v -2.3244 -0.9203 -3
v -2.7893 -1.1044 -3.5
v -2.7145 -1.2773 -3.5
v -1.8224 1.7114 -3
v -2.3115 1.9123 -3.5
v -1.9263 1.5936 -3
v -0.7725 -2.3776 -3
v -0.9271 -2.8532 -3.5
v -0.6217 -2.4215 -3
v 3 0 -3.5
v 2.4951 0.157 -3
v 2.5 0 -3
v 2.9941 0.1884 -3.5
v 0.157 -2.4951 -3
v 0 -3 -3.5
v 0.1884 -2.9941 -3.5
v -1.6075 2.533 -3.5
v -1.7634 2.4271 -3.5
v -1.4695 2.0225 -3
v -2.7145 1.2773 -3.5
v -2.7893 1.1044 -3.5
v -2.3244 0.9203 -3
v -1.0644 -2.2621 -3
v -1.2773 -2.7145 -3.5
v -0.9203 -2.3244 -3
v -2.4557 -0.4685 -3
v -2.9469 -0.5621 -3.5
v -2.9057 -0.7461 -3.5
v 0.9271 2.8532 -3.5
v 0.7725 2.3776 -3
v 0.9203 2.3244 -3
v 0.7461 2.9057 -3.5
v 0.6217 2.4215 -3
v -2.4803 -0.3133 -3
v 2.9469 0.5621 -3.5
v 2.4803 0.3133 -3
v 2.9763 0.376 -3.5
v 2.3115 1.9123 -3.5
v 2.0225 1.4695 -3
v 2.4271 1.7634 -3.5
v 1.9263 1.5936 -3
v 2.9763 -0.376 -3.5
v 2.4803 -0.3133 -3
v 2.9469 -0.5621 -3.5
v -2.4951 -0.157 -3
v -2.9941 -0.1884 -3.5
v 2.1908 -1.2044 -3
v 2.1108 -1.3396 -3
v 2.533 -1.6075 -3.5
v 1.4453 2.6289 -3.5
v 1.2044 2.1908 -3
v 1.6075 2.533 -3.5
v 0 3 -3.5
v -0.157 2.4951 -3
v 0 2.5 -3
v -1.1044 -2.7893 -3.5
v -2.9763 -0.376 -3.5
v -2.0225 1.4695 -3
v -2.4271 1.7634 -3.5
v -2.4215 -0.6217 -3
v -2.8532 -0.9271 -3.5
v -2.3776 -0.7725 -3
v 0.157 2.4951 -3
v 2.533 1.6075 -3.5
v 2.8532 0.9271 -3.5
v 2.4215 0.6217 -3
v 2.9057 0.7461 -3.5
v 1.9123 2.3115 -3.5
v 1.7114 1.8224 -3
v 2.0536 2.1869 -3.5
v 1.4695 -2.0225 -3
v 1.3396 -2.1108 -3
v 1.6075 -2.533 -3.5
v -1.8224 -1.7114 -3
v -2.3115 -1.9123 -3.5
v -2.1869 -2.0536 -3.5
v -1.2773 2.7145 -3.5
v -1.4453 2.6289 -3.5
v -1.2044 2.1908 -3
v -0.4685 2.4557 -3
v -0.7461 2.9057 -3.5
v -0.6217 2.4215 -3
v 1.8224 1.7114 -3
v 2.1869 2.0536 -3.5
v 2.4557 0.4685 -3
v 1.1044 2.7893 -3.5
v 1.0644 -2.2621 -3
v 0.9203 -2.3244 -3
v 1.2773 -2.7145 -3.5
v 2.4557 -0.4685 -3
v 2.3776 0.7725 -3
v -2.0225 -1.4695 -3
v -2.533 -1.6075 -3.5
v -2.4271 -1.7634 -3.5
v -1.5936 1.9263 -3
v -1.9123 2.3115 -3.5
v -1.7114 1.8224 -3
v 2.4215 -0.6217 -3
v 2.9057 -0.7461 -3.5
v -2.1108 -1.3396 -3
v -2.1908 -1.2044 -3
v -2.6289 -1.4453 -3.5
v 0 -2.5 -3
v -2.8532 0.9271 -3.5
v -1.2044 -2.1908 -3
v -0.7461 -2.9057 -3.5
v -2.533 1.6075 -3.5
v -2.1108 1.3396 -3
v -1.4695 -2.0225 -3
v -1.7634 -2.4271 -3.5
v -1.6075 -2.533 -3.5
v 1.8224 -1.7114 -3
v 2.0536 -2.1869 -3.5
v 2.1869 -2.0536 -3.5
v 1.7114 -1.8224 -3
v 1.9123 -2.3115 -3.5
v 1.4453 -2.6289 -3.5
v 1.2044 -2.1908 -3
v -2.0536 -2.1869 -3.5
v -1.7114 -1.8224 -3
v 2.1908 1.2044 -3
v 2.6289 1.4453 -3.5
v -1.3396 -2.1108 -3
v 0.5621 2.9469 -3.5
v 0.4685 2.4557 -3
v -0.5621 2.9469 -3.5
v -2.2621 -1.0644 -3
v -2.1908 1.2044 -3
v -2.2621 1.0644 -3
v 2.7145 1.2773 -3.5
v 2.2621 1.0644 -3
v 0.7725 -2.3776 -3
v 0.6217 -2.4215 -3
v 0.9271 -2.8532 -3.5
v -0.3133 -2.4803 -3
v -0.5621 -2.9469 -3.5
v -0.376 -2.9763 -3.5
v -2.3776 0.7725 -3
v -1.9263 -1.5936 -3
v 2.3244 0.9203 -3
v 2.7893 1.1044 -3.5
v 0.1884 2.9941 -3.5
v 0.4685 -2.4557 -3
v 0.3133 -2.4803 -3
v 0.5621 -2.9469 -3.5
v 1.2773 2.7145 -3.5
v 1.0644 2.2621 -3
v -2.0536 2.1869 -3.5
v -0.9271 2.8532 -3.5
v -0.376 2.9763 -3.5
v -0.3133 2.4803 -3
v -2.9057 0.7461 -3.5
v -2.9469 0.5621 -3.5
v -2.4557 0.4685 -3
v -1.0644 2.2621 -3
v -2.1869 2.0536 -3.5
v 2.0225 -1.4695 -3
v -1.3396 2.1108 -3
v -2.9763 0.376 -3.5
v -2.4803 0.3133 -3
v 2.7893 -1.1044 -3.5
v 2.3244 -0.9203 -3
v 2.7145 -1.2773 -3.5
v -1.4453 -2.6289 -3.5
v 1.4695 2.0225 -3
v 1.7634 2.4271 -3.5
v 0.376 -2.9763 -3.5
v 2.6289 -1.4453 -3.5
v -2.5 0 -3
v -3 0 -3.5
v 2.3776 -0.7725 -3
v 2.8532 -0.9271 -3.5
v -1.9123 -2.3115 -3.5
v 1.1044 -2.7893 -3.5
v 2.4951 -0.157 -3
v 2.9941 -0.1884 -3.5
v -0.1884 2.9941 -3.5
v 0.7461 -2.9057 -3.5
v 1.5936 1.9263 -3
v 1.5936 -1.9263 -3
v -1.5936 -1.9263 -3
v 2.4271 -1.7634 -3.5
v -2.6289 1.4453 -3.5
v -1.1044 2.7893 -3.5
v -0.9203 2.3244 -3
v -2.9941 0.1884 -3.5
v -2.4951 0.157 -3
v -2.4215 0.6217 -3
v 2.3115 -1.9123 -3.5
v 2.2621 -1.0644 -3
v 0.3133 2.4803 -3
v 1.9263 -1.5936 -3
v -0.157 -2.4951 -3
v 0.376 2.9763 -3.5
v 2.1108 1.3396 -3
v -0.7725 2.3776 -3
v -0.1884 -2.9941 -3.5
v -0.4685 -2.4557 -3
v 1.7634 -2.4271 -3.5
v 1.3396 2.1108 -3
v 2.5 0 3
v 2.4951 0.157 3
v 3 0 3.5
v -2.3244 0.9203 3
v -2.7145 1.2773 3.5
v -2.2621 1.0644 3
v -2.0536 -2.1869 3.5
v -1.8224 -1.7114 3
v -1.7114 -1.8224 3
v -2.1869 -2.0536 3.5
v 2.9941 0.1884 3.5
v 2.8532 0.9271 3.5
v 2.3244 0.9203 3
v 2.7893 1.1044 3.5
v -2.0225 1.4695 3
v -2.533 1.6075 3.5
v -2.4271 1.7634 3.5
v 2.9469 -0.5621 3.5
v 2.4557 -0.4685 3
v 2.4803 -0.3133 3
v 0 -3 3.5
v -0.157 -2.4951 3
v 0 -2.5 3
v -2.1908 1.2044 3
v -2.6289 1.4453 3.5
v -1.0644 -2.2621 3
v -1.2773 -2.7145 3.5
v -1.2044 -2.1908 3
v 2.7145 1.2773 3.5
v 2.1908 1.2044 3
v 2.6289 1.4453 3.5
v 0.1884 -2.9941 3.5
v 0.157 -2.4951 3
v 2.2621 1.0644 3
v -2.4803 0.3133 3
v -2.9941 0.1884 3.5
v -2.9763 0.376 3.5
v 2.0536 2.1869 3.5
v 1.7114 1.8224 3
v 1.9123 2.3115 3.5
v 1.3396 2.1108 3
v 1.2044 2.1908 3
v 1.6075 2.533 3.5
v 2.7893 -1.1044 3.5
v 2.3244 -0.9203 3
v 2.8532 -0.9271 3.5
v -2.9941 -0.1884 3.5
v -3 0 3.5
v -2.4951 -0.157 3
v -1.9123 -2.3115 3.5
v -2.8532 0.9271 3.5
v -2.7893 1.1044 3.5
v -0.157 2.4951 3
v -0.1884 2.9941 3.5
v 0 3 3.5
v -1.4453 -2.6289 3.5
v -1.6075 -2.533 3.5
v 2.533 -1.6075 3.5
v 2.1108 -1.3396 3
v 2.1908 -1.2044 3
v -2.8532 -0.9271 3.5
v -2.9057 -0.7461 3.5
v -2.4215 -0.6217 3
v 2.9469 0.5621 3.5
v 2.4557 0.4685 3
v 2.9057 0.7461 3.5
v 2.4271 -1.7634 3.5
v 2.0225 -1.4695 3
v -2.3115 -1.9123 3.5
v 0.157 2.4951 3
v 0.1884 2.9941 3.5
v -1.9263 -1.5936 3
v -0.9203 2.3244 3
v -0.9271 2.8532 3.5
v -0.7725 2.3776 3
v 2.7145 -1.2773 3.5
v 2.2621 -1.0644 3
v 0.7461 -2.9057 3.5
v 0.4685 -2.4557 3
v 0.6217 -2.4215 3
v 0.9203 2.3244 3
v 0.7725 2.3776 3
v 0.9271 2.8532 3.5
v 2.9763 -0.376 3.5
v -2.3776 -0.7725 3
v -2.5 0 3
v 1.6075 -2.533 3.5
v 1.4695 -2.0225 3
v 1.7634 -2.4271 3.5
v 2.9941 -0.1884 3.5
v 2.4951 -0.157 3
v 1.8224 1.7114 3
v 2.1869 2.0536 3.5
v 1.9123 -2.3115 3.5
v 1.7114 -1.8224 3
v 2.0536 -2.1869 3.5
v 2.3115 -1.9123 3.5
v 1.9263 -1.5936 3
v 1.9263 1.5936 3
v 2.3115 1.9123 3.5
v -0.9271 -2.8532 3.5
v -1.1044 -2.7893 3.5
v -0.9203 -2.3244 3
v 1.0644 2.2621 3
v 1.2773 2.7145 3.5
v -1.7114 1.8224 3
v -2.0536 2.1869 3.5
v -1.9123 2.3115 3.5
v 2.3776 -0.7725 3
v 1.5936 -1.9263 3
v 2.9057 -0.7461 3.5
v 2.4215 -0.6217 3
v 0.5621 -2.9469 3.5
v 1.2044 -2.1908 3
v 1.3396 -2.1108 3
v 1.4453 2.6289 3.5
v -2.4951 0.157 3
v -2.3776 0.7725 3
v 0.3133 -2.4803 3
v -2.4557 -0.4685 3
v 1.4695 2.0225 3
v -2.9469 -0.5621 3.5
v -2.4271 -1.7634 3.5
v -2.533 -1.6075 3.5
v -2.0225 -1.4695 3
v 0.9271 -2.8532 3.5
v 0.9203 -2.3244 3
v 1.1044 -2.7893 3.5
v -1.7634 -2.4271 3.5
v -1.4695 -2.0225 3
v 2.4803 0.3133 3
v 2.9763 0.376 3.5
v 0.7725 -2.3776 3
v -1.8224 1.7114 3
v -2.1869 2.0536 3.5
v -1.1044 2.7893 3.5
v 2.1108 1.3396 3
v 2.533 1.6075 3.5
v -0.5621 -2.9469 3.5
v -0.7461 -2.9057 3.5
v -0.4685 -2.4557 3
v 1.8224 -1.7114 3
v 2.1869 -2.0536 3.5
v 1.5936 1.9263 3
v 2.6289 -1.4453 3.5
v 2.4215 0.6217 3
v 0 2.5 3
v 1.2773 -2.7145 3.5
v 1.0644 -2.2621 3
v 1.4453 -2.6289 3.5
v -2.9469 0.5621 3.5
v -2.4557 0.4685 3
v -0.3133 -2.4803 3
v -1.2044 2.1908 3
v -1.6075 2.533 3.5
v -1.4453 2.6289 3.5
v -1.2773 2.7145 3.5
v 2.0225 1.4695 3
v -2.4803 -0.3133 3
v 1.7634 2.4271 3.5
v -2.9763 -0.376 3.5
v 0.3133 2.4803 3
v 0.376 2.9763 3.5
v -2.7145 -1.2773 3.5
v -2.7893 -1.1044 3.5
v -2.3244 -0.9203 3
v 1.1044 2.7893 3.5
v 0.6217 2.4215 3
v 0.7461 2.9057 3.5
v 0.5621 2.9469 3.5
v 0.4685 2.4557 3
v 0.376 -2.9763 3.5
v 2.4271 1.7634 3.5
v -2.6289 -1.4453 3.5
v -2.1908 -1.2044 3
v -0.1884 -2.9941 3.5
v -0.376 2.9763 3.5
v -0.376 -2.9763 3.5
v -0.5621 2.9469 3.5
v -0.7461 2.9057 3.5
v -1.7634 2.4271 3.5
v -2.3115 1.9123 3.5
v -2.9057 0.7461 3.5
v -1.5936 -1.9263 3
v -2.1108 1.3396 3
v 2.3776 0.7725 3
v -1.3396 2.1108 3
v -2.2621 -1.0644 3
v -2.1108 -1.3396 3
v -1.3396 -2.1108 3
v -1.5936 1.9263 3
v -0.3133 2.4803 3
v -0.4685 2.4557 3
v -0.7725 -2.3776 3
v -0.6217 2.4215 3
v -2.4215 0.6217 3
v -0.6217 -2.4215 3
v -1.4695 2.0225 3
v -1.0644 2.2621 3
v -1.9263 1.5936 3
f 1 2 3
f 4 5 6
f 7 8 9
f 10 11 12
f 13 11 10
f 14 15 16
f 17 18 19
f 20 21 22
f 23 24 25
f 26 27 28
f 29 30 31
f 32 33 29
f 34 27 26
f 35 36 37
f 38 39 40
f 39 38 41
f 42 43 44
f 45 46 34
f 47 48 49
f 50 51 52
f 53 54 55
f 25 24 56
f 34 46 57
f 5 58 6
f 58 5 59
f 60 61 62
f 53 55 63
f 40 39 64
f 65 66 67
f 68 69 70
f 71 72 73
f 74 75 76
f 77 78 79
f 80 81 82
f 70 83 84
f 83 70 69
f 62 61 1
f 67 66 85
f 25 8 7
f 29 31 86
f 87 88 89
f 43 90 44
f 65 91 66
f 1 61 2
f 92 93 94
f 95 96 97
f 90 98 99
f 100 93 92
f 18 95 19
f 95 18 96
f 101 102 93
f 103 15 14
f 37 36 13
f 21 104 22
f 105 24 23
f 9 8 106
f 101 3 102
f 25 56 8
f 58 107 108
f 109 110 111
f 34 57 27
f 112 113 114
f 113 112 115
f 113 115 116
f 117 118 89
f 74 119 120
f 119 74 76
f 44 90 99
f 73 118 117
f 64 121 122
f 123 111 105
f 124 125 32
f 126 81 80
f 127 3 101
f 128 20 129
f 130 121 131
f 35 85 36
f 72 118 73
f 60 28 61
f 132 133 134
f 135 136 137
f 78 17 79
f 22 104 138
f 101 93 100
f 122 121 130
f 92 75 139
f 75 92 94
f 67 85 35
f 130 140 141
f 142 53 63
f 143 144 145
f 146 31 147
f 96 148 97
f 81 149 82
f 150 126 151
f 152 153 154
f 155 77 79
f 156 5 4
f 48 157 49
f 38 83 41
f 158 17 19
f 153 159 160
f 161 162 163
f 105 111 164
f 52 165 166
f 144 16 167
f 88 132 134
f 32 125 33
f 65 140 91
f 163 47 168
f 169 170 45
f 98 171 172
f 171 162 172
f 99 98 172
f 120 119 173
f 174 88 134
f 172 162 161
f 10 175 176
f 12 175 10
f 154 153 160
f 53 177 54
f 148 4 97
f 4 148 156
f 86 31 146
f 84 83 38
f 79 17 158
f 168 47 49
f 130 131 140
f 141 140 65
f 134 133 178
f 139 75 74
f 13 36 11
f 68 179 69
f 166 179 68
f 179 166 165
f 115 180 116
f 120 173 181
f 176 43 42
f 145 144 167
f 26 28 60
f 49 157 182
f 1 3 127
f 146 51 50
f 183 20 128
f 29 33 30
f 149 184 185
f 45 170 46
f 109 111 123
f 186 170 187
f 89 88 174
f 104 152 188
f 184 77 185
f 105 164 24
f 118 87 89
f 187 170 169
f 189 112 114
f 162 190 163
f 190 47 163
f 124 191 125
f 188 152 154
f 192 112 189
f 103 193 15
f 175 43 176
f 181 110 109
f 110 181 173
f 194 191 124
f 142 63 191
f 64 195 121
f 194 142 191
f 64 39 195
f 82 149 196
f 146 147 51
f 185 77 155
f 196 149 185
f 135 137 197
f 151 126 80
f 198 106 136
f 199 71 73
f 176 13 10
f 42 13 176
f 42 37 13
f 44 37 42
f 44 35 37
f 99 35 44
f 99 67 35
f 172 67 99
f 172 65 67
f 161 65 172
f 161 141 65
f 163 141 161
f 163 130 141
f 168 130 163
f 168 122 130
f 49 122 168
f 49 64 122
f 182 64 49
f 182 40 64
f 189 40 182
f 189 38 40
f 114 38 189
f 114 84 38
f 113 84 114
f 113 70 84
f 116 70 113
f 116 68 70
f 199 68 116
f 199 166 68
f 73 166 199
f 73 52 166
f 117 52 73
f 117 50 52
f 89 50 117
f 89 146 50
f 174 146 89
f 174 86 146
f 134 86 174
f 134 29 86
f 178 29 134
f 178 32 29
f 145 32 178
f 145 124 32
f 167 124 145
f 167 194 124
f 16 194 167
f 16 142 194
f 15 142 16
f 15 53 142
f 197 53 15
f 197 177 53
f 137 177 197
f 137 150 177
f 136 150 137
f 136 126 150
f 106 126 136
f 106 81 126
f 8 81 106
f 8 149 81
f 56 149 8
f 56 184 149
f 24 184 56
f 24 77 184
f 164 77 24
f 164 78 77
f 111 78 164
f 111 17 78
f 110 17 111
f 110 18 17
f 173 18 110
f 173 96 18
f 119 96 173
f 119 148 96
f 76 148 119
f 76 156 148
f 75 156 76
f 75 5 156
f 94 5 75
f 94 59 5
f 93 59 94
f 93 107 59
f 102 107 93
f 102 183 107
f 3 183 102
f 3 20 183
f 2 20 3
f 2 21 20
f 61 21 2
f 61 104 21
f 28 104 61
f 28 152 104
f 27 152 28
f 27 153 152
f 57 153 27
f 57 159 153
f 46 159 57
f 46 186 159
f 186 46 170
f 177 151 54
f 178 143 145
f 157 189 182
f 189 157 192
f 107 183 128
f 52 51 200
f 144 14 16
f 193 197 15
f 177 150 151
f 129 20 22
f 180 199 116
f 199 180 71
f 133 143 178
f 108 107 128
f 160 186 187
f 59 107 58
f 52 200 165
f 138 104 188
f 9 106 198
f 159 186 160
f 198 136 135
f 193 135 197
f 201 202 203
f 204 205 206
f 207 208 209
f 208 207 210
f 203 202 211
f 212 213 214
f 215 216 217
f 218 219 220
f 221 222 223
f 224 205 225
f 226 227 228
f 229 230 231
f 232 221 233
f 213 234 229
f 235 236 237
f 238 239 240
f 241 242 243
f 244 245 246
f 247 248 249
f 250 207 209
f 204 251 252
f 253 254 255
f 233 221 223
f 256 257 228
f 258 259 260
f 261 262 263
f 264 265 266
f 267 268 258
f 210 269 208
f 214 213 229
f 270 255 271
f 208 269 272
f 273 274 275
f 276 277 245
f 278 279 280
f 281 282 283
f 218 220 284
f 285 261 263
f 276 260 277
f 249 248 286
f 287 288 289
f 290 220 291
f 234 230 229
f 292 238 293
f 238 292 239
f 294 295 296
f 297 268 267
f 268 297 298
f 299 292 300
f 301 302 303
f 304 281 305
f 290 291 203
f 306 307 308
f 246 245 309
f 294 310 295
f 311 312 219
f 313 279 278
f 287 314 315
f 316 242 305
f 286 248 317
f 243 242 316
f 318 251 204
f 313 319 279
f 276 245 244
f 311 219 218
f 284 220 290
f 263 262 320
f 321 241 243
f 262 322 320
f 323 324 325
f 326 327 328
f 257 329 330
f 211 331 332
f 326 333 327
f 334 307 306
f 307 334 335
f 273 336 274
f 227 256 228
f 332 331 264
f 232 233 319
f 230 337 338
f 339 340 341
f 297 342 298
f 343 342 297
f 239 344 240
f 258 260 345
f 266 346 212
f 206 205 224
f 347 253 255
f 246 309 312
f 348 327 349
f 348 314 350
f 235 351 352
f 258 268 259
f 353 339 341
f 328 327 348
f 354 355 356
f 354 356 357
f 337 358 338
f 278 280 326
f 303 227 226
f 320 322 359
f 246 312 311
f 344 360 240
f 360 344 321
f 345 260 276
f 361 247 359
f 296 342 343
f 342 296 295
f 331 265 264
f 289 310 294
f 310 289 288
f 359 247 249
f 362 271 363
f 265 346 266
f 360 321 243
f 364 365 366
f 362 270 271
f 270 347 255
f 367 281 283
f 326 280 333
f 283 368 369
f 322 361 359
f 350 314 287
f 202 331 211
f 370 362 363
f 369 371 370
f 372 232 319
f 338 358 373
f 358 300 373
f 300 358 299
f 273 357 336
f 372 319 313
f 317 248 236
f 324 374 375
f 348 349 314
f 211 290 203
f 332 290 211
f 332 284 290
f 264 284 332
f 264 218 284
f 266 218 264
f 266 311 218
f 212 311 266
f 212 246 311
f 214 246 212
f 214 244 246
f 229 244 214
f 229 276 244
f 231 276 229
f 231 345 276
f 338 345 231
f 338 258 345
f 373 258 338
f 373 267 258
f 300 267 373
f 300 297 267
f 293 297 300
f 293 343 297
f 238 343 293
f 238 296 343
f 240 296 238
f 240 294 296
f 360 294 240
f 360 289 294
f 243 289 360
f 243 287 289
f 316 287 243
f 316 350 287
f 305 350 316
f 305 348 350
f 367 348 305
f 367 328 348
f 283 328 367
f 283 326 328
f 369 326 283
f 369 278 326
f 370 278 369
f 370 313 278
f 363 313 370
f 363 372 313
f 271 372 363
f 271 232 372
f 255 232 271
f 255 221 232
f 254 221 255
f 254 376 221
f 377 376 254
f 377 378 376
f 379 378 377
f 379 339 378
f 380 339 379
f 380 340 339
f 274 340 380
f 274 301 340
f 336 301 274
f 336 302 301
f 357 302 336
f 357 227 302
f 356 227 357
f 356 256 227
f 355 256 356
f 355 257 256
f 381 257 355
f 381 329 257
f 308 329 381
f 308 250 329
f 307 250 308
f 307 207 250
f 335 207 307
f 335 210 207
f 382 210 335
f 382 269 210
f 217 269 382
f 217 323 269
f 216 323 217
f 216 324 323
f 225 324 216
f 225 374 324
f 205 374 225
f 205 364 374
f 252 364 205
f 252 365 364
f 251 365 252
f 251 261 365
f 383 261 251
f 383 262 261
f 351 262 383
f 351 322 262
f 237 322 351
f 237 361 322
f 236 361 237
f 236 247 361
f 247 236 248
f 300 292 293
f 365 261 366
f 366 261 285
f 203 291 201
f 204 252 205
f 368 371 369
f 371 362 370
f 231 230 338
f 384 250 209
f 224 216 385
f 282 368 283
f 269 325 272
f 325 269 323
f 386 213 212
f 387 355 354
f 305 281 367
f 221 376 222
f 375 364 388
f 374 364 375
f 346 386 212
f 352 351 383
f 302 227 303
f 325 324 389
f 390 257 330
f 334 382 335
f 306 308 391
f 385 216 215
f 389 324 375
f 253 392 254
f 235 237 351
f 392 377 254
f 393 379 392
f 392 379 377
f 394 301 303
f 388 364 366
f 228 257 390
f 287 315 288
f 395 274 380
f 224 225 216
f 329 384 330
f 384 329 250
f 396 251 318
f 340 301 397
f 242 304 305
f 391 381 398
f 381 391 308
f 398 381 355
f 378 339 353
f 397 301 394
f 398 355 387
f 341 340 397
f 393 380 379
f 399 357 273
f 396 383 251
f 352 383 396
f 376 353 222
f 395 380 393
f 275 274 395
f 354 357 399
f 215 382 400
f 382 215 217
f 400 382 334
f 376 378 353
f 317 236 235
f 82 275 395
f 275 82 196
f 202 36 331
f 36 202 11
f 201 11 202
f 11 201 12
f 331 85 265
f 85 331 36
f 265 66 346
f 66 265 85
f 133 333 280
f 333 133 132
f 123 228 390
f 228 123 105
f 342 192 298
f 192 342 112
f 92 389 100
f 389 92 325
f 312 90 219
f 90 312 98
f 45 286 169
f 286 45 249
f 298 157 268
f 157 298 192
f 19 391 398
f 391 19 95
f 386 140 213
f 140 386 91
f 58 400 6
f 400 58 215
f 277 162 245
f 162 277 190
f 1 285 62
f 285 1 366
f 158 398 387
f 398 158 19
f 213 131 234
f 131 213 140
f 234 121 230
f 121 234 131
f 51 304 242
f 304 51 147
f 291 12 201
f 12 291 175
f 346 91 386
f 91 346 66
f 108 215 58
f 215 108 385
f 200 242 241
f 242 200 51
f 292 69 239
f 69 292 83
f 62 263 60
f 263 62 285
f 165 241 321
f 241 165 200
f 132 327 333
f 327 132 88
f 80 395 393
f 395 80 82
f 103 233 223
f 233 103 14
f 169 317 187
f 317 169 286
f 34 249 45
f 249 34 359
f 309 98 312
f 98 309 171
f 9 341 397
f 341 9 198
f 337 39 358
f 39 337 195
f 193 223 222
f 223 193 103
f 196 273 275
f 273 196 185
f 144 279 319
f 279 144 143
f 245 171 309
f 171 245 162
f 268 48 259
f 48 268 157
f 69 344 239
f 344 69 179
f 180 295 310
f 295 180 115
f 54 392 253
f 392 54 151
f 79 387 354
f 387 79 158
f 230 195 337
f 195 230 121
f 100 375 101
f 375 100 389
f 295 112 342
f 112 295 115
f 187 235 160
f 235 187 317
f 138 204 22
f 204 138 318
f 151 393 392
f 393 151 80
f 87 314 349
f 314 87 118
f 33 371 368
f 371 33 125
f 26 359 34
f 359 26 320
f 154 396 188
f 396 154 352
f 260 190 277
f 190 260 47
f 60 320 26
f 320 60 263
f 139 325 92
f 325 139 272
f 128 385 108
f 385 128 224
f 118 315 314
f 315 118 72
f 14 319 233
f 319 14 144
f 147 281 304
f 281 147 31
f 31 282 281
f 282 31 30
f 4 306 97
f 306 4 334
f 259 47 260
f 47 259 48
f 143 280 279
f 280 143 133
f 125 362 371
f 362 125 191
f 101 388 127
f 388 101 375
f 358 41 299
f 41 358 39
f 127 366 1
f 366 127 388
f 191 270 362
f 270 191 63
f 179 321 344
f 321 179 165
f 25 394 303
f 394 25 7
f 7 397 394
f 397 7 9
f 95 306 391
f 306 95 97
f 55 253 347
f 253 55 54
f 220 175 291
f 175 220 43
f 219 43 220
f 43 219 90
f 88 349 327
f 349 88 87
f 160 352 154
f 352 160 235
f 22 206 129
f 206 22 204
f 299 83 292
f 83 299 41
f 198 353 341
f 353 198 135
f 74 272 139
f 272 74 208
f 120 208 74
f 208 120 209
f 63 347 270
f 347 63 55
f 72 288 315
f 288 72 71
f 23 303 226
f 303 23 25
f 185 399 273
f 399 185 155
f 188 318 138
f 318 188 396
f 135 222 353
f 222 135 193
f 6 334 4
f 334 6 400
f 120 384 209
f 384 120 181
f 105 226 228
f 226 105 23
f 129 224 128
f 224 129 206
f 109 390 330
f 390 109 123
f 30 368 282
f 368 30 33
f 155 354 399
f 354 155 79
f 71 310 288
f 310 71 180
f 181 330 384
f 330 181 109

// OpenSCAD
// file: mirror_copy.scad
module mirror_copy(vector=[1,0,0]){
    children();
    mirror(vector) children();
}
// main file
use<mirror_copy.scad>

//module dowel(d,l,chamfer)
//d=diameter, le=length,chamfer=chamfer size
//create a dowel with a chamfer at each end. If chamfer is a negative value the dowel can be subtracted from a shape to create a chamfered hole

//Example 1: 
dowel(5,7,-0.5); //standard dowel
//Example 2:
/*difference(){
    cube([50,50,20],center=true);
    dowel(d=10,l=20,chamfer=-1);
}
*/
module dowel(d=10,l=30,chamfer=-1){
    $fn=100;
    union(){
        cylinder(h=l-2*abs(chamfer),d=d,center=true);
        mirror_copy([0,0,1])translate([0,0,(abs(chamfer)-l)/2])
        cylinder(h=abs(chamfer),r2=d/2,r1=d/2-chamfer,center=true);
    }
}
